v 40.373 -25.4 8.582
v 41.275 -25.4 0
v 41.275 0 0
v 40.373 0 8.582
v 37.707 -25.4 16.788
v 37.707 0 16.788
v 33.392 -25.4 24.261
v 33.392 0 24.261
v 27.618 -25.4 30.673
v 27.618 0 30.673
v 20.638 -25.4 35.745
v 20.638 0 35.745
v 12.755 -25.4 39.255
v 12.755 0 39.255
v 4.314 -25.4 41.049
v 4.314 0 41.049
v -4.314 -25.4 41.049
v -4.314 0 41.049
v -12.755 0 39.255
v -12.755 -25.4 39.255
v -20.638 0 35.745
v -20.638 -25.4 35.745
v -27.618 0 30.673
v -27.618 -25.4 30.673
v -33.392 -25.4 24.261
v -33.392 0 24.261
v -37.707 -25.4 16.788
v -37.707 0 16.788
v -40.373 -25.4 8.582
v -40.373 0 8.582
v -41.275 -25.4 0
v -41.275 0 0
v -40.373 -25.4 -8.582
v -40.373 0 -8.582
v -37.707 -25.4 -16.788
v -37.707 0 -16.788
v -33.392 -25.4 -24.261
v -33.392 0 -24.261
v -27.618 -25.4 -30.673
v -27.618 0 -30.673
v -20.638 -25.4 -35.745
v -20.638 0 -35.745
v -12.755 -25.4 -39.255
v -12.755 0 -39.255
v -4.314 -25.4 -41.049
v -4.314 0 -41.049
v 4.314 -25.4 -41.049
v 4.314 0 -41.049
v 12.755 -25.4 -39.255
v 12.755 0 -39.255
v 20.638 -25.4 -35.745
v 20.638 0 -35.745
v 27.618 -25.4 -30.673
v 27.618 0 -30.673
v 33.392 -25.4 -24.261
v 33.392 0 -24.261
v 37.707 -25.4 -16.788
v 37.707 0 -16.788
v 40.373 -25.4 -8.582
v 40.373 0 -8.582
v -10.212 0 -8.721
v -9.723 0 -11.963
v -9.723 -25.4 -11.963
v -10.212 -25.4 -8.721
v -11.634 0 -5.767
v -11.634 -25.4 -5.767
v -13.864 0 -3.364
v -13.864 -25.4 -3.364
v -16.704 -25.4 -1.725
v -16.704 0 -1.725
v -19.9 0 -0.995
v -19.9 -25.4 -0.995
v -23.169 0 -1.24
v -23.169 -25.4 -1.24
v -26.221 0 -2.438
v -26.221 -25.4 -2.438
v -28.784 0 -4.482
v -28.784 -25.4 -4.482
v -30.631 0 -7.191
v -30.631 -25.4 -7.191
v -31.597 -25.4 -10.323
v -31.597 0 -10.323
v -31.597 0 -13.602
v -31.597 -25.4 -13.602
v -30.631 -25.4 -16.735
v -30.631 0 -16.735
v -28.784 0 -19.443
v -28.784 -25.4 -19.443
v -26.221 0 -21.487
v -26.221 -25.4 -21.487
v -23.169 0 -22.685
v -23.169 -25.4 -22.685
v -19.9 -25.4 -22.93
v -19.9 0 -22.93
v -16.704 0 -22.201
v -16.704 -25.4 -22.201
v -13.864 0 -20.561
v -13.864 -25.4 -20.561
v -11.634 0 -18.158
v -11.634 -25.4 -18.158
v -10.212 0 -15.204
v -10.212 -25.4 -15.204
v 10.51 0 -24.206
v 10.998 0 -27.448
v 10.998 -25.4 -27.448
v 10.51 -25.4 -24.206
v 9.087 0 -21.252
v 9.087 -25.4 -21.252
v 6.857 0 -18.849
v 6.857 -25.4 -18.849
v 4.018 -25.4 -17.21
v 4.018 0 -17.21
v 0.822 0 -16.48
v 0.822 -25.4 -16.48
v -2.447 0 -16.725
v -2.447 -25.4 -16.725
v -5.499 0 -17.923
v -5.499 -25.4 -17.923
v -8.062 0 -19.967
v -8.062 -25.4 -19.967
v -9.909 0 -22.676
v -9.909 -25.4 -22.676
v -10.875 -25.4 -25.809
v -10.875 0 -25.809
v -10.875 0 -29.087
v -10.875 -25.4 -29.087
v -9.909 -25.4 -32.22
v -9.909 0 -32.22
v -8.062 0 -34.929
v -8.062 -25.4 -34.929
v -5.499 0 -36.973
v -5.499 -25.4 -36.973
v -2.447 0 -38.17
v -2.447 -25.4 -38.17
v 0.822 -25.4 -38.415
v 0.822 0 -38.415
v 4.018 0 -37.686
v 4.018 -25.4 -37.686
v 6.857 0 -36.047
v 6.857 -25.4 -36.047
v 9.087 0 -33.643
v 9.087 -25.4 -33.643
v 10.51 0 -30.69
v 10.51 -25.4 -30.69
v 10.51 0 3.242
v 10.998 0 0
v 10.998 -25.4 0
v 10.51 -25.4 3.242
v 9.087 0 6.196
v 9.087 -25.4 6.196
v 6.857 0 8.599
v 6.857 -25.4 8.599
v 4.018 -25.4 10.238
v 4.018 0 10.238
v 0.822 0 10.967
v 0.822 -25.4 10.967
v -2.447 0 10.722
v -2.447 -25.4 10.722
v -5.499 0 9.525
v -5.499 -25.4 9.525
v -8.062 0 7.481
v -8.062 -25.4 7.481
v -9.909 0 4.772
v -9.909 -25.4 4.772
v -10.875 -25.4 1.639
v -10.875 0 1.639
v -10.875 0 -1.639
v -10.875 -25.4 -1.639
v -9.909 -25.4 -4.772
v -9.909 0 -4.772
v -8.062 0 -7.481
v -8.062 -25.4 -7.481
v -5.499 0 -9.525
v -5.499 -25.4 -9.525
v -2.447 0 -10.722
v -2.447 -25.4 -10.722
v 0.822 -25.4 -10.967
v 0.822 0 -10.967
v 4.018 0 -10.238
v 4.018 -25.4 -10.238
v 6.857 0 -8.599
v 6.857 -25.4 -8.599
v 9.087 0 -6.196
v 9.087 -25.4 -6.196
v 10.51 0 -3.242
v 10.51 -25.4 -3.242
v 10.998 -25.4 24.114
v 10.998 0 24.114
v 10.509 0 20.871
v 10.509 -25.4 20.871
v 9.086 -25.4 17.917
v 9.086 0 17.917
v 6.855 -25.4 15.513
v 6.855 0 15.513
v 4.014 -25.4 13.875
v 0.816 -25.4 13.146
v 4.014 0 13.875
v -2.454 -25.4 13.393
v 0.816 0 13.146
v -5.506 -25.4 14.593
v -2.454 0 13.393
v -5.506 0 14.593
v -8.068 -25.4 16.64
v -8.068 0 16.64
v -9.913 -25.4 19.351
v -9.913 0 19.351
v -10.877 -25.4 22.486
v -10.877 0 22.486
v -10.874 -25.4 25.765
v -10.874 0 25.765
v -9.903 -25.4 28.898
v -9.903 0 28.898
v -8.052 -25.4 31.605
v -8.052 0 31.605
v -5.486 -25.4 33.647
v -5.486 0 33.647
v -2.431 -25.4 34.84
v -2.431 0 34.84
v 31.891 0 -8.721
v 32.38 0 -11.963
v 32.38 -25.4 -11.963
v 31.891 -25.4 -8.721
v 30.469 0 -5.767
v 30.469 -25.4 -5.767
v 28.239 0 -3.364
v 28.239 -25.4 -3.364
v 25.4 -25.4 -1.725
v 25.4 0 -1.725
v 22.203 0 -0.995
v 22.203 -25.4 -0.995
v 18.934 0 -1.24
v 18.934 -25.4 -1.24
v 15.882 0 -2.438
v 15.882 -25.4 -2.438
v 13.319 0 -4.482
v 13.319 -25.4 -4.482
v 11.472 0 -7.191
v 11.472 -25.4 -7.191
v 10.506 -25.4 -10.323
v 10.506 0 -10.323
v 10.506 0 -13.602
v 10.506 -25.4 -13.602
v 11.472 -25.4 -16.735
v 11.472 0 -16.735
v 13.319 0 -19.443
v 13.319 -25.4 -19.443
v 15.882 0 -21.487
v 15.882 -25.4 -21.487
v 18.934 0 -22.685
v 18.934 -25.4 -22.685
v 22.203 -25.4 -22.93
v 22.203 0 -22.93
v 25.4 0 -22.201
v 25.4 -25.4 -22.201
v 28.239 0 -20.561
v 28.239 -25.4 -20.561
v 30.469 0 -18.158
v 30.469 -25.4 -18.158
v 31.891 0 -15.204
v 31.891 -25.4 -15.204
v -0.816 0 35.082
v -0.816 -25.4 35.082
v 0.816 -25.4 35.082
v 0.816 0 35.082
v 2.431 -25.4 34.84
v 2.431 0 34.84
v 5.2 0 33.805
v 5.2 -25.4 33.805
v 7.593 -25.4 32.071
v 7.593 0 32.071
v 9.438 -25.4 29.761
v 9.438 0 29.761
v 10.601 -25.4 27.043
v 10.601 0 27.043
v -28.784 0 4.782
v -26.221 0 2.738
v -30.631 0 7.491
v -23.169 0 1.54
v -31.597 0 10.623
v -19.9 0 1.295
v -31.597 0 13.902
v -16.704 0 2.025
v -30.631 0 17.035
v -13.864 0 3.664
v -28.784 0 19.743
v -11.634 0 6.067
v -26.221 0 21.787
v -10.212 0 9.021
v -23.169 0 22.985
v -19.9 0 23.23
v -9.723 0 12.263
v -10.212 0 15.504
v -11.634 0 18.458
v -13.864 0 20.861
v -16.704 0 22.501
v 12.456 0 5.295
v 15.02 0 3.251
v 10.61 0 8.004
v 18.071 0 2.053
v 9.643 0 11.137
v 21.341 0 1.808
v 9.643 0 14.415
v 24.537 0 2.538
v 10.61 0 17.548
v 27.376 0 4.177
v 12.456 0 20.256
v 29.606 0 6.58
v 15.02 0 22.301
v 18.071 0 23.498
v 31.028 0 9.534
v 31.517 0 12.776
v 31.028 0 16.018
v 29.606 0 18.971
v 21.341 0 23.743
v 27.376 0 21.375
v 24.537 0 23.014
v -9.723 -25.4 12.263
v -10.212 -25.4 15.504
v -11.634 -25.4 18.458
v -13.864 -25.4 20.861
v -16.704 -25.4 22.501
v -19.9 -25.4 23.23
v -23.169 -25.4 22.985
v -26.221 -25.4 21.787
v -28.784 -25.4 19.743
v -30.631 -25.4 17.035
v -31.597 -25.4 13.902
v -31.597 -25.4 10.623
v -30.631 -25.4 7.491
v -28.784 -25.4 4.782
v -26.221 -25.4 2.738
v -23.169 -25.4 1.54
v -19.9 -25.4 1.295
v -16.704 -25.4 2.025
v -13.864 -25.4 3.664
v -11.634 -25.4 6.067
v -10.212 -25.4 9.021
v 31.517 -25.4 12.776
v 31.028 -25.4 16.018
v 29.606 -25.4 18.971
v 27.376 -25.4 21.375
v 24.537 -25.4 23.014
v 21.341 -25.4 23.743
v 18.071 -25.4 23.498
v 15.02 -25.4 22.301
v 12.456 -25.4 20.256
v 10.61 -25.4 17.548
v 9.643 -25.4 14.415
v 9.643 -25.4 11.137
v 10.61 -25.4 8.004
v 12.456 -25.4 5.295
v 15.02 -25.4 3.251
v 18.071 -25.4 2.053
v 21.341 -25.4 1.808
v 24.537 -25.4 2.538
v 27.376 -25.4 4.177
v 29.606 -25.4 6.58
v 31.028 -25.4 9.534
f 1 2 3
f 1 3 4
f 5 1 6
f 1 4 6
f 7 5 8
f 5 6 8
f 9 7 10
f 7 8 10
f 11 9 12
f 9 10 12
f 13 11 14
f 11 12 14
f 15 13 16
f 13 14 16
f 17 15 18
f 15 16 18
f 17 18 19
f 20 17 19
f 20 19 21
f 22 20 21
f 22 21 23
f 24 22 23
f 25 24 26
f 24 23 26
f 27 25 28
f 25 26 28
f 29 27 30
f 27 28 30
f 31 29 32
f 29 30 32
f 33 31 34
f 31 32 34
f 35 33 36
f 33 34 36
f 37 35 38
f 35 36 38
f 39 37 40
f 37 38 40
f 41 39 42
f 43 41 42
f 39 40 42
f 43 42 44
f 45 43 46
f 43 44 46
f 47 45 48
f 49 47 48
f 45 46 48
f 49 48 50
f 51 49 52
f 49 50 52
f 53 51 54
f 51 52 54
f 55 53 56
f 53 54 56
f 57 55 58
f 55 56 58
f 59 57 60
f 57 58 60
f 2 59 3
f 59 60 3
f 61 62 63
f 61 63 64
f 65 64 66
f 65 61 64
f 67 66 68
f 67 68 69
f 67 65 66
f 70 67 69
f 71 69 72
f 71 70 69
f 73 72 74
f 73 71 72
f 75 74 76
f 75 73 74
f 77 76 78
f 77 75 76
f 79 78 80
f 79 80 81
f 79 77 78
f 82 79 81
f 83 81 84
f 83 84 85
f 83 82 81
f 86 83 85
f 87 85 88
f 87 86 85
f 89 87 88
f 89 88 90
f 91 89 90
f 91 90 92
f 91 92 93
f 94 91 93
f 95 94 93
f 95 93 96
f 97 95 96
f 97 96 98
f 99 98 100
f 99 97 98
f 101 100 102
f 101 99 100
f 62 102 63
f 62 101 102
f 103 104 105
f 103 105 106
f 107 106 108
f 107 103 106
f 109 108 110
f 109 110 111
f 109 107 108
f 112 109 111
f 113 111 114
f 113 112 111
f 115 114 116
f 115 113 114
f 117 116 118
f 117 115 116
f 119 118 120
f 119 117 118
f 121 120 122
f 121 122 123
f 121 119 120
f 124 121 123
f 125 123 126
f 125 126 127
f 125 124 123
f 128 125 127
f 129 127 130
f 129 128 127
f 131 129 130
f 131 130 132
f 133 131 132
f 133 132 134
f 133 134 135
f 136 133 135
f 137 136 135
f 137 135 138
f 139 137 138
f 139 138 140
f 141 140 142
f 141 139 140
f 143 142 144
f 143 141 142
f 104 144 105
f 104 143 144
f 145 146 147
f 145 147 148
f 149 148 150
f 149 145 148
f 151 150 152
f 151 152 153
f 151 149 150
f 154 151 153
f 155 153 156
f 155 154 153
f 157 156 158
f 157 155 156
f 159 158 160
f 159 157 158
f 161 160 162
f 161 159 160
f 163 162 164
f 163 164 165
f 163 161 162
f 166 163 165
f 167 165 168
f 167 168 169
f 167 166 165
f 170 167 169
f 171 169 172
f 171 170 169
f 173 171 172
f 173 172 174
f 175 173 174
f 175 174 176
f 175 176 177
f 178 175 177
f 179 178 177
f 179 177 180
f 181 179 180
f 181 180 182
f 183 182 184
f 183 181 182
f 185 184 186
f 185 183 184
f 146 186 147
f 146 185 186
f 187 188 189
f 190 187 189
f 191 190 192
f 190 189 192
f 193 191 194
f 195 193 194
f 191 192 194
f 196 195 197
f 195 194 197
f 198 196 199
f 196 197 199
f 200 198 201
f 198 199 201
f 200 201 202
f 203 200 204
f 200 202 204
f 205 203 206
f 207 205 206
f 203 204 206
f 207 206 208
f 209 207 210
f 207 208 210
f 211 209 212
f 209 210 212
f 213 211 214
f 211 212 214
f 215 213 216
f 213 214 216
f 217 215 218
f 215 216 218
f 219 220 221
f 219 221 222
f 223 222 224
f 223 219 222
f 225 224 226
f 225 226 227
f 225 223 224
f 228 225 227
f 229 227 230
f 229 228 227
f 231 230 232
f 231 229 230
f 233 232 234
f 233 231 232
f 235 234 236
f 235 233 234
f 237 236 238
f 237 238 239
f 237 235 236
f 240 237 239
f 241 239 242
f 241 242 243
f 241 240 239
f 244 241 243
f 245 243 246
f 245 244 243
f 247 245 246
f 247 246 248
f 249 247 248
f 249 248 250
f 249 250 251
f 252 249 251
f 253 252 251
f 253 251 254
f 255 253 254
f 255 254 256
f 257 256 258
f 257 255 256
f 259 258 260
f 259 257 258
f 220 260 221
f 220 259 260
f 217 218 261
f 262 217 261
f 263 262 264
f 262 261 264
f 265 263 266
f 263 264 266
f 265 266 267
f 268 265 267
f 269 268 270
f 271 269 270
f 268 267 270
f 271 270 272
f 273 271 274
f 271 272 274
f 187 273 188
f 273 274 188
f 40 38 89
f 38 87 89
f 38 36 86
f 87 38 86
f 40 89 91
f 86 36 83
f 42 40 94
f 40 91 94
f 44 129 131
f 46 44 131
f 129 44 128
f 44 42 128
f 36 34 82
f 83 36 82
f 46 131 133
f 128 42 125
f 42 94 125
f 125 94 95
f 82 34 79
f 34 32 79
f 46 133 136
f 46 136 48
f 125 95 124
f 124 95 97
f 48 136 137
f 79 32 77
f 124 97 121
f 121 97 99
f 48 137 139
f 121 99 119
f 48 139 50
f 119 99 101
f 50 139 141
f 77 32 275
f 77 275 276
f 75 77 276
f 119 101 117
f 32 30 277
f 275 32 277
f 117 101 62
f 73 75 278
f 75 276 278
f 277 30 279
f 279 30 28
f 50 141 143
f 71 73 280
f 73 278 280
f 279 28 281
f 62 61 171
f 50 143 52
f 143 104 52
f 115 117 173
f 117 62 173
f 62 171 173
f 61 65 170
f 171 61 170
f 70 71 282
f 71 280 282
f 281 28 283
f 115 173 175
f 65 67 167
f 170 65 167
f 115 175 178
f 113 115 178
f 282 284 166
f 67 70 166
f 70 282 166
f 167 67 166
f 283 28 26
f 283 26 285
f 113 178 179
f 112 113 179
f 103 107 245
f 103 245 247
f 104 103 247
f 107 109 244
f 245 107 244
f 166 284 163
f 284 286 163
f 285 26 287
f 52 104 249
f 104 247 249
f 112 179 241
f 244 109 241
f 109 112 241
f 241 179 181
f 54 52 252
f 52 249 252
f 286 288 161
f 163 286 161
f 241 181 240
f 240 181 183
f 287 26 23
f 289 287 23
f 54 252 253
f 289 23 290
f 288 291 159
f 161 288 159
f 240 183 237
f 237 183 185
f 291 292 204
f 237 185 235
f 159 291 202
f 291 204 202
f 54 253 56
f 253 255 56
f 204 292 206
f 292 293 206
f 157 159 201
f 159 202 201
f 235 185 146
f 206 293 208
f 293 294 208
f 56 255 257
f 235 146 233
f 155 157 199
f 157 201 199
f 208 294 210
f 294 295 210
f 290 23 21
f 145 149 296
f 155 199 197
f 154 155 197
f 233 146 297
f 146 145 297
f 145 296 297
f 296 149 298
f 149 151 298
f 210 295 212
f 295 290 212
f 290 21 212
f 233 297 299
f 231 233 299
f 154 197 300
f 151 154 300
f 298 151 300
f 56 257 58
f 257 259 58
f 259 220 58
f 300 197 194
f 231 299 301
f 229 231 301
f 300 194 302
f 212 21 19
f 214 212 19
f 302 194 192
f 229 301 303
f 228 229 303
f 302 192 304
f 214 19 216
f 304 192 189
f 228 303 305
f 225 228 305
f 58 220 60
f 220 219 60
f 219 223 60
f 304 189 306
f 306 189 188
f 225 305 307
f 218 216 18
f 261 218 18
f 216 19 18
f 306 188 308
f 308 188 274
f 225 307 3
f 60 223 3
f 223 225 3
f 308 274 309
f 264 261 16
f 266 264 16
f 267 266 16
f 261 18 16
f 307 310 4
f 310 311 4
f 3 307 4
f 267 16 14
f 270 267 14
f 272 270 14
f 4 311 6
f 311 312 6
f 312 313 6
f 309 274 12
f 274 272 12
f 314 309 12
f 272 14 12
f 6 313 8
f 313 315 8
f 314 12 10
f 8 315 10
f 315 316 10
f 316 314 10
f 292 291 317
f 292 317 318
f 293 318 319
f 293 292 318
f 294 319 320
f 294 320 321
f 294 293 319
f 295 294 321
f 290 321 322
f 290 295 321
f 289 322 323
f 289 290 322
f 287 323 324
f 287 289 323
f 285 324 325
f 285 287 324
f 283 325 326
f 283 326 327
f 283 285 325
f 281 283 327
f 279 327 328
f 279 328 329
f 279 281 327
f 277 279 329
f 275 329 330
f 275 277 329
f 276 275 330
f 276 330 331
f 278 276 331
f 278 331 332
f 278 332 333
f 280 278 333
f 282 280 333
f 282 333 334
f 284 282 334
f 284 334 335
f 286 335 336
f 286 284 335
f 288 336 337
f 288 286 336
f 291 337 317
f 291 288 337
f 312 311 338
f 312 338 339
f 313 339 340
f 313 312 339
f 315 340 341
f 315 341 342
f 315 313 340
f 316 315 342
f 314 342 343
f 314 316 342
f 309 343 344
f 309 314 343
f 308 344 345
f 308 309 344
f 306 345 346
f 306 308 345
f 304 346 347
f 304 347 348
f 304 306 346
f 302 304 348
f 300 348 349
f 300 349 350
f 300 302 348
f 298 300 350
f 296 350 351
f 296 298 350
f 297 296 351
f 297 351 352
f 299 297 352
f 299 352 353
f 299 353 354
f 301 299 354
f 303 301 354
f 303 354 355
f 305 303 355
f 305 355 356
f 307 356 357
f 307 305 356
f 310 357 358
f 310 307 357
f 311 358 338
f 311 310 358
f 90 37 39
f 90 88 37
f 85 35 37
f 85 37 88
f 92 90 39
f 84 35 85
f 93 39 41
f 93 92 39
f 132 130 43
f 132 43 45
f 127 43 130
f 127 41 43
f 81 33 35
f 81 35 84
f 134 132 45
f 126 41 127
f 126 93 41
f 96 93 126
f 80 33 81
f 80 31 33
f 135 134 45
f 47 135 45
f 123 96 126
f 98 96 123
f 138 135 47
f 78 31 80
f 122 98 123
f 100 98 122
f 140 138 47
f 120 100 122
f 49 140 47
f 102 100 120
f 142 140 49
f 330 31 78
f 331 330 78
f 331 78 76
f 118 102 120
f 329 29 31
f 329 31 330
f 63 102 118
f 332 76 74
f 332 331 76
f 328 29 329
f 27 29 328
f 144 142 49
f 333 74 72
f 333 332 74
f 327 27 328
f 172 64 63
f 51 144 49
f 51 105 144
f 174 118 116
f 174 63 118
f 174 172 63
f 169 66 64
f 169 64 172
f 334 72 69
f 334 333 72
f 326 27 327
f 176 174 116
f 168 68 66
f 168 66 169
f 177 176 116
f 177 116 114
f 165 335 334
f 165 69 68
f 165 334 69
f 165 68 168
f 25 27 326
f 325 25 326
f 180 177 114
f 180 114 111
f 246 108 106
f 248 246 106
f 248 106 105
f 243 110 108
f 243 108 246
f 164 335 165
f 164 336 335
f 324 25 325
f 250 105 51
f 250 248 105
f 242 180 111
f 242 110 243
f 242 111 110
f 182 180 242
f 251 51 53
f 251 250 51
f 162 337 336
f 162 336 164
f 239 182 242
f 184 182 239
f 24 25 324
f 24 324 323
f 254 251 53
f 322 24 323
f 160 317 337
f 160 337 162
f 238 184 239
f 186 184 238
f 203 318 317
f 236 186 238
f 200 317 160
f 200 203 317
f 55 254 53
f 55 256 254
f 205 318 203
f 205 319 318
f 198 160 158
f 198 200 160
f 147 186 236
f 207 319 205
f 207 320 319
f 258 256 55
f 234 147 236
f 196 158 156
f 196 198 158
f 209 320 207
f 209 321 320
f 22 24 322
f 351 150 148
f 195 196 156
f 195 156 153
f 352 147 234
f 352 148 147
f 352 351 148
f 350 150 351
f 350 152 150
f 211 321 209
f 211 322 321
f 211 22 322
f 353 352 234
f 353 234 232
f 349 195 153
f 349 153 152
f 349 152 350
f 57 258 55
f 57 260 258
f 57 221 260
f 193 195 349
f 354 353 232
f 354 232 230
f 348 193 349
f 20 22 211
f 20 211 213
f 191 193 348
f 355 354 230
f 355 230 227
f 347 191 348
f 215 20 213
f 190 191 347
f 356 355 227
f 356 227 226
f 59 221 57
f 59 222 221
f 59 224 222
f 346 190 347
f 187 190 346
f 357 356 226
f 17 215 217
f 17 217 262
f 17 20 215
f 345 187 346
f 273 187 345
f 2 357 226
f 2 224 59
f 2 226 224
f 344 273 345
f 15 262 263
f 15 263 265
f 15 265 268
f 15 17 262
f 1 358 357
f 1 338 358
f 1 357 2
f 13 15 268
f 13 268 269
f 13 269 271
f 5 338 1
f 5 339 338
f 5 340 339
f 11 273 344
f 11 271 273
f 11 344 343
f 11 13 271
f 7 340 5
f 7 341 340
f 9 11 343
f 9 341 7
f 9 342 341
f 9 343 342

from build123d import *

# Parameters (mm, degrees)
F0_R     = 41.275
F0_R_2   = 10.9982
F1_DEPTH = 25.4


with BuildPart() as f1:
    # F0 (on Front) → F1 (new body)
    with BuildSketch(Plane.XZ):
        Circle(F0_R)
        with Locations((-20.721636, -11.962674)):
            Circle(F0_R_2, mode=Mode.SUBTRACT)
        with Locations((0, -27.447874)):
            Circle(F0_R_2, mode=Mode.SUBTRACT)
        with Locations((21.38141, -11.962674)):
            Circle(F0_R_2, mode=Mode.SUBTRACT)
        with Locations((-20.721636, 12.262576)):
            Circle(F0_R_2, mode=Mode.SUBTRACT)
        Circle(F0_R_2, mode=Mode.SUBTRACT)
        with Locations((20.518694, 12.77579)):
            Circle(F0_R_2, mode=Mode.SUBTRACT)
        with BuildLine():
            ThreePointArc((-2.430999, 34.840291), (0, 35.112324), (2.430999, 34.840291))
            ThreePointArc((2.430999, 34.840291), (8.593516, 30.977935), (10.9982, 24.114124))
            ThreePointArc((10.9982, 24.114124), (-6.86381, 15.520609), (-2.430999, 34.840291))
        make_face(mode=Mode.SUBTRACT)
    extrude(amount=F1_DEPTH)


solid = f1.part
